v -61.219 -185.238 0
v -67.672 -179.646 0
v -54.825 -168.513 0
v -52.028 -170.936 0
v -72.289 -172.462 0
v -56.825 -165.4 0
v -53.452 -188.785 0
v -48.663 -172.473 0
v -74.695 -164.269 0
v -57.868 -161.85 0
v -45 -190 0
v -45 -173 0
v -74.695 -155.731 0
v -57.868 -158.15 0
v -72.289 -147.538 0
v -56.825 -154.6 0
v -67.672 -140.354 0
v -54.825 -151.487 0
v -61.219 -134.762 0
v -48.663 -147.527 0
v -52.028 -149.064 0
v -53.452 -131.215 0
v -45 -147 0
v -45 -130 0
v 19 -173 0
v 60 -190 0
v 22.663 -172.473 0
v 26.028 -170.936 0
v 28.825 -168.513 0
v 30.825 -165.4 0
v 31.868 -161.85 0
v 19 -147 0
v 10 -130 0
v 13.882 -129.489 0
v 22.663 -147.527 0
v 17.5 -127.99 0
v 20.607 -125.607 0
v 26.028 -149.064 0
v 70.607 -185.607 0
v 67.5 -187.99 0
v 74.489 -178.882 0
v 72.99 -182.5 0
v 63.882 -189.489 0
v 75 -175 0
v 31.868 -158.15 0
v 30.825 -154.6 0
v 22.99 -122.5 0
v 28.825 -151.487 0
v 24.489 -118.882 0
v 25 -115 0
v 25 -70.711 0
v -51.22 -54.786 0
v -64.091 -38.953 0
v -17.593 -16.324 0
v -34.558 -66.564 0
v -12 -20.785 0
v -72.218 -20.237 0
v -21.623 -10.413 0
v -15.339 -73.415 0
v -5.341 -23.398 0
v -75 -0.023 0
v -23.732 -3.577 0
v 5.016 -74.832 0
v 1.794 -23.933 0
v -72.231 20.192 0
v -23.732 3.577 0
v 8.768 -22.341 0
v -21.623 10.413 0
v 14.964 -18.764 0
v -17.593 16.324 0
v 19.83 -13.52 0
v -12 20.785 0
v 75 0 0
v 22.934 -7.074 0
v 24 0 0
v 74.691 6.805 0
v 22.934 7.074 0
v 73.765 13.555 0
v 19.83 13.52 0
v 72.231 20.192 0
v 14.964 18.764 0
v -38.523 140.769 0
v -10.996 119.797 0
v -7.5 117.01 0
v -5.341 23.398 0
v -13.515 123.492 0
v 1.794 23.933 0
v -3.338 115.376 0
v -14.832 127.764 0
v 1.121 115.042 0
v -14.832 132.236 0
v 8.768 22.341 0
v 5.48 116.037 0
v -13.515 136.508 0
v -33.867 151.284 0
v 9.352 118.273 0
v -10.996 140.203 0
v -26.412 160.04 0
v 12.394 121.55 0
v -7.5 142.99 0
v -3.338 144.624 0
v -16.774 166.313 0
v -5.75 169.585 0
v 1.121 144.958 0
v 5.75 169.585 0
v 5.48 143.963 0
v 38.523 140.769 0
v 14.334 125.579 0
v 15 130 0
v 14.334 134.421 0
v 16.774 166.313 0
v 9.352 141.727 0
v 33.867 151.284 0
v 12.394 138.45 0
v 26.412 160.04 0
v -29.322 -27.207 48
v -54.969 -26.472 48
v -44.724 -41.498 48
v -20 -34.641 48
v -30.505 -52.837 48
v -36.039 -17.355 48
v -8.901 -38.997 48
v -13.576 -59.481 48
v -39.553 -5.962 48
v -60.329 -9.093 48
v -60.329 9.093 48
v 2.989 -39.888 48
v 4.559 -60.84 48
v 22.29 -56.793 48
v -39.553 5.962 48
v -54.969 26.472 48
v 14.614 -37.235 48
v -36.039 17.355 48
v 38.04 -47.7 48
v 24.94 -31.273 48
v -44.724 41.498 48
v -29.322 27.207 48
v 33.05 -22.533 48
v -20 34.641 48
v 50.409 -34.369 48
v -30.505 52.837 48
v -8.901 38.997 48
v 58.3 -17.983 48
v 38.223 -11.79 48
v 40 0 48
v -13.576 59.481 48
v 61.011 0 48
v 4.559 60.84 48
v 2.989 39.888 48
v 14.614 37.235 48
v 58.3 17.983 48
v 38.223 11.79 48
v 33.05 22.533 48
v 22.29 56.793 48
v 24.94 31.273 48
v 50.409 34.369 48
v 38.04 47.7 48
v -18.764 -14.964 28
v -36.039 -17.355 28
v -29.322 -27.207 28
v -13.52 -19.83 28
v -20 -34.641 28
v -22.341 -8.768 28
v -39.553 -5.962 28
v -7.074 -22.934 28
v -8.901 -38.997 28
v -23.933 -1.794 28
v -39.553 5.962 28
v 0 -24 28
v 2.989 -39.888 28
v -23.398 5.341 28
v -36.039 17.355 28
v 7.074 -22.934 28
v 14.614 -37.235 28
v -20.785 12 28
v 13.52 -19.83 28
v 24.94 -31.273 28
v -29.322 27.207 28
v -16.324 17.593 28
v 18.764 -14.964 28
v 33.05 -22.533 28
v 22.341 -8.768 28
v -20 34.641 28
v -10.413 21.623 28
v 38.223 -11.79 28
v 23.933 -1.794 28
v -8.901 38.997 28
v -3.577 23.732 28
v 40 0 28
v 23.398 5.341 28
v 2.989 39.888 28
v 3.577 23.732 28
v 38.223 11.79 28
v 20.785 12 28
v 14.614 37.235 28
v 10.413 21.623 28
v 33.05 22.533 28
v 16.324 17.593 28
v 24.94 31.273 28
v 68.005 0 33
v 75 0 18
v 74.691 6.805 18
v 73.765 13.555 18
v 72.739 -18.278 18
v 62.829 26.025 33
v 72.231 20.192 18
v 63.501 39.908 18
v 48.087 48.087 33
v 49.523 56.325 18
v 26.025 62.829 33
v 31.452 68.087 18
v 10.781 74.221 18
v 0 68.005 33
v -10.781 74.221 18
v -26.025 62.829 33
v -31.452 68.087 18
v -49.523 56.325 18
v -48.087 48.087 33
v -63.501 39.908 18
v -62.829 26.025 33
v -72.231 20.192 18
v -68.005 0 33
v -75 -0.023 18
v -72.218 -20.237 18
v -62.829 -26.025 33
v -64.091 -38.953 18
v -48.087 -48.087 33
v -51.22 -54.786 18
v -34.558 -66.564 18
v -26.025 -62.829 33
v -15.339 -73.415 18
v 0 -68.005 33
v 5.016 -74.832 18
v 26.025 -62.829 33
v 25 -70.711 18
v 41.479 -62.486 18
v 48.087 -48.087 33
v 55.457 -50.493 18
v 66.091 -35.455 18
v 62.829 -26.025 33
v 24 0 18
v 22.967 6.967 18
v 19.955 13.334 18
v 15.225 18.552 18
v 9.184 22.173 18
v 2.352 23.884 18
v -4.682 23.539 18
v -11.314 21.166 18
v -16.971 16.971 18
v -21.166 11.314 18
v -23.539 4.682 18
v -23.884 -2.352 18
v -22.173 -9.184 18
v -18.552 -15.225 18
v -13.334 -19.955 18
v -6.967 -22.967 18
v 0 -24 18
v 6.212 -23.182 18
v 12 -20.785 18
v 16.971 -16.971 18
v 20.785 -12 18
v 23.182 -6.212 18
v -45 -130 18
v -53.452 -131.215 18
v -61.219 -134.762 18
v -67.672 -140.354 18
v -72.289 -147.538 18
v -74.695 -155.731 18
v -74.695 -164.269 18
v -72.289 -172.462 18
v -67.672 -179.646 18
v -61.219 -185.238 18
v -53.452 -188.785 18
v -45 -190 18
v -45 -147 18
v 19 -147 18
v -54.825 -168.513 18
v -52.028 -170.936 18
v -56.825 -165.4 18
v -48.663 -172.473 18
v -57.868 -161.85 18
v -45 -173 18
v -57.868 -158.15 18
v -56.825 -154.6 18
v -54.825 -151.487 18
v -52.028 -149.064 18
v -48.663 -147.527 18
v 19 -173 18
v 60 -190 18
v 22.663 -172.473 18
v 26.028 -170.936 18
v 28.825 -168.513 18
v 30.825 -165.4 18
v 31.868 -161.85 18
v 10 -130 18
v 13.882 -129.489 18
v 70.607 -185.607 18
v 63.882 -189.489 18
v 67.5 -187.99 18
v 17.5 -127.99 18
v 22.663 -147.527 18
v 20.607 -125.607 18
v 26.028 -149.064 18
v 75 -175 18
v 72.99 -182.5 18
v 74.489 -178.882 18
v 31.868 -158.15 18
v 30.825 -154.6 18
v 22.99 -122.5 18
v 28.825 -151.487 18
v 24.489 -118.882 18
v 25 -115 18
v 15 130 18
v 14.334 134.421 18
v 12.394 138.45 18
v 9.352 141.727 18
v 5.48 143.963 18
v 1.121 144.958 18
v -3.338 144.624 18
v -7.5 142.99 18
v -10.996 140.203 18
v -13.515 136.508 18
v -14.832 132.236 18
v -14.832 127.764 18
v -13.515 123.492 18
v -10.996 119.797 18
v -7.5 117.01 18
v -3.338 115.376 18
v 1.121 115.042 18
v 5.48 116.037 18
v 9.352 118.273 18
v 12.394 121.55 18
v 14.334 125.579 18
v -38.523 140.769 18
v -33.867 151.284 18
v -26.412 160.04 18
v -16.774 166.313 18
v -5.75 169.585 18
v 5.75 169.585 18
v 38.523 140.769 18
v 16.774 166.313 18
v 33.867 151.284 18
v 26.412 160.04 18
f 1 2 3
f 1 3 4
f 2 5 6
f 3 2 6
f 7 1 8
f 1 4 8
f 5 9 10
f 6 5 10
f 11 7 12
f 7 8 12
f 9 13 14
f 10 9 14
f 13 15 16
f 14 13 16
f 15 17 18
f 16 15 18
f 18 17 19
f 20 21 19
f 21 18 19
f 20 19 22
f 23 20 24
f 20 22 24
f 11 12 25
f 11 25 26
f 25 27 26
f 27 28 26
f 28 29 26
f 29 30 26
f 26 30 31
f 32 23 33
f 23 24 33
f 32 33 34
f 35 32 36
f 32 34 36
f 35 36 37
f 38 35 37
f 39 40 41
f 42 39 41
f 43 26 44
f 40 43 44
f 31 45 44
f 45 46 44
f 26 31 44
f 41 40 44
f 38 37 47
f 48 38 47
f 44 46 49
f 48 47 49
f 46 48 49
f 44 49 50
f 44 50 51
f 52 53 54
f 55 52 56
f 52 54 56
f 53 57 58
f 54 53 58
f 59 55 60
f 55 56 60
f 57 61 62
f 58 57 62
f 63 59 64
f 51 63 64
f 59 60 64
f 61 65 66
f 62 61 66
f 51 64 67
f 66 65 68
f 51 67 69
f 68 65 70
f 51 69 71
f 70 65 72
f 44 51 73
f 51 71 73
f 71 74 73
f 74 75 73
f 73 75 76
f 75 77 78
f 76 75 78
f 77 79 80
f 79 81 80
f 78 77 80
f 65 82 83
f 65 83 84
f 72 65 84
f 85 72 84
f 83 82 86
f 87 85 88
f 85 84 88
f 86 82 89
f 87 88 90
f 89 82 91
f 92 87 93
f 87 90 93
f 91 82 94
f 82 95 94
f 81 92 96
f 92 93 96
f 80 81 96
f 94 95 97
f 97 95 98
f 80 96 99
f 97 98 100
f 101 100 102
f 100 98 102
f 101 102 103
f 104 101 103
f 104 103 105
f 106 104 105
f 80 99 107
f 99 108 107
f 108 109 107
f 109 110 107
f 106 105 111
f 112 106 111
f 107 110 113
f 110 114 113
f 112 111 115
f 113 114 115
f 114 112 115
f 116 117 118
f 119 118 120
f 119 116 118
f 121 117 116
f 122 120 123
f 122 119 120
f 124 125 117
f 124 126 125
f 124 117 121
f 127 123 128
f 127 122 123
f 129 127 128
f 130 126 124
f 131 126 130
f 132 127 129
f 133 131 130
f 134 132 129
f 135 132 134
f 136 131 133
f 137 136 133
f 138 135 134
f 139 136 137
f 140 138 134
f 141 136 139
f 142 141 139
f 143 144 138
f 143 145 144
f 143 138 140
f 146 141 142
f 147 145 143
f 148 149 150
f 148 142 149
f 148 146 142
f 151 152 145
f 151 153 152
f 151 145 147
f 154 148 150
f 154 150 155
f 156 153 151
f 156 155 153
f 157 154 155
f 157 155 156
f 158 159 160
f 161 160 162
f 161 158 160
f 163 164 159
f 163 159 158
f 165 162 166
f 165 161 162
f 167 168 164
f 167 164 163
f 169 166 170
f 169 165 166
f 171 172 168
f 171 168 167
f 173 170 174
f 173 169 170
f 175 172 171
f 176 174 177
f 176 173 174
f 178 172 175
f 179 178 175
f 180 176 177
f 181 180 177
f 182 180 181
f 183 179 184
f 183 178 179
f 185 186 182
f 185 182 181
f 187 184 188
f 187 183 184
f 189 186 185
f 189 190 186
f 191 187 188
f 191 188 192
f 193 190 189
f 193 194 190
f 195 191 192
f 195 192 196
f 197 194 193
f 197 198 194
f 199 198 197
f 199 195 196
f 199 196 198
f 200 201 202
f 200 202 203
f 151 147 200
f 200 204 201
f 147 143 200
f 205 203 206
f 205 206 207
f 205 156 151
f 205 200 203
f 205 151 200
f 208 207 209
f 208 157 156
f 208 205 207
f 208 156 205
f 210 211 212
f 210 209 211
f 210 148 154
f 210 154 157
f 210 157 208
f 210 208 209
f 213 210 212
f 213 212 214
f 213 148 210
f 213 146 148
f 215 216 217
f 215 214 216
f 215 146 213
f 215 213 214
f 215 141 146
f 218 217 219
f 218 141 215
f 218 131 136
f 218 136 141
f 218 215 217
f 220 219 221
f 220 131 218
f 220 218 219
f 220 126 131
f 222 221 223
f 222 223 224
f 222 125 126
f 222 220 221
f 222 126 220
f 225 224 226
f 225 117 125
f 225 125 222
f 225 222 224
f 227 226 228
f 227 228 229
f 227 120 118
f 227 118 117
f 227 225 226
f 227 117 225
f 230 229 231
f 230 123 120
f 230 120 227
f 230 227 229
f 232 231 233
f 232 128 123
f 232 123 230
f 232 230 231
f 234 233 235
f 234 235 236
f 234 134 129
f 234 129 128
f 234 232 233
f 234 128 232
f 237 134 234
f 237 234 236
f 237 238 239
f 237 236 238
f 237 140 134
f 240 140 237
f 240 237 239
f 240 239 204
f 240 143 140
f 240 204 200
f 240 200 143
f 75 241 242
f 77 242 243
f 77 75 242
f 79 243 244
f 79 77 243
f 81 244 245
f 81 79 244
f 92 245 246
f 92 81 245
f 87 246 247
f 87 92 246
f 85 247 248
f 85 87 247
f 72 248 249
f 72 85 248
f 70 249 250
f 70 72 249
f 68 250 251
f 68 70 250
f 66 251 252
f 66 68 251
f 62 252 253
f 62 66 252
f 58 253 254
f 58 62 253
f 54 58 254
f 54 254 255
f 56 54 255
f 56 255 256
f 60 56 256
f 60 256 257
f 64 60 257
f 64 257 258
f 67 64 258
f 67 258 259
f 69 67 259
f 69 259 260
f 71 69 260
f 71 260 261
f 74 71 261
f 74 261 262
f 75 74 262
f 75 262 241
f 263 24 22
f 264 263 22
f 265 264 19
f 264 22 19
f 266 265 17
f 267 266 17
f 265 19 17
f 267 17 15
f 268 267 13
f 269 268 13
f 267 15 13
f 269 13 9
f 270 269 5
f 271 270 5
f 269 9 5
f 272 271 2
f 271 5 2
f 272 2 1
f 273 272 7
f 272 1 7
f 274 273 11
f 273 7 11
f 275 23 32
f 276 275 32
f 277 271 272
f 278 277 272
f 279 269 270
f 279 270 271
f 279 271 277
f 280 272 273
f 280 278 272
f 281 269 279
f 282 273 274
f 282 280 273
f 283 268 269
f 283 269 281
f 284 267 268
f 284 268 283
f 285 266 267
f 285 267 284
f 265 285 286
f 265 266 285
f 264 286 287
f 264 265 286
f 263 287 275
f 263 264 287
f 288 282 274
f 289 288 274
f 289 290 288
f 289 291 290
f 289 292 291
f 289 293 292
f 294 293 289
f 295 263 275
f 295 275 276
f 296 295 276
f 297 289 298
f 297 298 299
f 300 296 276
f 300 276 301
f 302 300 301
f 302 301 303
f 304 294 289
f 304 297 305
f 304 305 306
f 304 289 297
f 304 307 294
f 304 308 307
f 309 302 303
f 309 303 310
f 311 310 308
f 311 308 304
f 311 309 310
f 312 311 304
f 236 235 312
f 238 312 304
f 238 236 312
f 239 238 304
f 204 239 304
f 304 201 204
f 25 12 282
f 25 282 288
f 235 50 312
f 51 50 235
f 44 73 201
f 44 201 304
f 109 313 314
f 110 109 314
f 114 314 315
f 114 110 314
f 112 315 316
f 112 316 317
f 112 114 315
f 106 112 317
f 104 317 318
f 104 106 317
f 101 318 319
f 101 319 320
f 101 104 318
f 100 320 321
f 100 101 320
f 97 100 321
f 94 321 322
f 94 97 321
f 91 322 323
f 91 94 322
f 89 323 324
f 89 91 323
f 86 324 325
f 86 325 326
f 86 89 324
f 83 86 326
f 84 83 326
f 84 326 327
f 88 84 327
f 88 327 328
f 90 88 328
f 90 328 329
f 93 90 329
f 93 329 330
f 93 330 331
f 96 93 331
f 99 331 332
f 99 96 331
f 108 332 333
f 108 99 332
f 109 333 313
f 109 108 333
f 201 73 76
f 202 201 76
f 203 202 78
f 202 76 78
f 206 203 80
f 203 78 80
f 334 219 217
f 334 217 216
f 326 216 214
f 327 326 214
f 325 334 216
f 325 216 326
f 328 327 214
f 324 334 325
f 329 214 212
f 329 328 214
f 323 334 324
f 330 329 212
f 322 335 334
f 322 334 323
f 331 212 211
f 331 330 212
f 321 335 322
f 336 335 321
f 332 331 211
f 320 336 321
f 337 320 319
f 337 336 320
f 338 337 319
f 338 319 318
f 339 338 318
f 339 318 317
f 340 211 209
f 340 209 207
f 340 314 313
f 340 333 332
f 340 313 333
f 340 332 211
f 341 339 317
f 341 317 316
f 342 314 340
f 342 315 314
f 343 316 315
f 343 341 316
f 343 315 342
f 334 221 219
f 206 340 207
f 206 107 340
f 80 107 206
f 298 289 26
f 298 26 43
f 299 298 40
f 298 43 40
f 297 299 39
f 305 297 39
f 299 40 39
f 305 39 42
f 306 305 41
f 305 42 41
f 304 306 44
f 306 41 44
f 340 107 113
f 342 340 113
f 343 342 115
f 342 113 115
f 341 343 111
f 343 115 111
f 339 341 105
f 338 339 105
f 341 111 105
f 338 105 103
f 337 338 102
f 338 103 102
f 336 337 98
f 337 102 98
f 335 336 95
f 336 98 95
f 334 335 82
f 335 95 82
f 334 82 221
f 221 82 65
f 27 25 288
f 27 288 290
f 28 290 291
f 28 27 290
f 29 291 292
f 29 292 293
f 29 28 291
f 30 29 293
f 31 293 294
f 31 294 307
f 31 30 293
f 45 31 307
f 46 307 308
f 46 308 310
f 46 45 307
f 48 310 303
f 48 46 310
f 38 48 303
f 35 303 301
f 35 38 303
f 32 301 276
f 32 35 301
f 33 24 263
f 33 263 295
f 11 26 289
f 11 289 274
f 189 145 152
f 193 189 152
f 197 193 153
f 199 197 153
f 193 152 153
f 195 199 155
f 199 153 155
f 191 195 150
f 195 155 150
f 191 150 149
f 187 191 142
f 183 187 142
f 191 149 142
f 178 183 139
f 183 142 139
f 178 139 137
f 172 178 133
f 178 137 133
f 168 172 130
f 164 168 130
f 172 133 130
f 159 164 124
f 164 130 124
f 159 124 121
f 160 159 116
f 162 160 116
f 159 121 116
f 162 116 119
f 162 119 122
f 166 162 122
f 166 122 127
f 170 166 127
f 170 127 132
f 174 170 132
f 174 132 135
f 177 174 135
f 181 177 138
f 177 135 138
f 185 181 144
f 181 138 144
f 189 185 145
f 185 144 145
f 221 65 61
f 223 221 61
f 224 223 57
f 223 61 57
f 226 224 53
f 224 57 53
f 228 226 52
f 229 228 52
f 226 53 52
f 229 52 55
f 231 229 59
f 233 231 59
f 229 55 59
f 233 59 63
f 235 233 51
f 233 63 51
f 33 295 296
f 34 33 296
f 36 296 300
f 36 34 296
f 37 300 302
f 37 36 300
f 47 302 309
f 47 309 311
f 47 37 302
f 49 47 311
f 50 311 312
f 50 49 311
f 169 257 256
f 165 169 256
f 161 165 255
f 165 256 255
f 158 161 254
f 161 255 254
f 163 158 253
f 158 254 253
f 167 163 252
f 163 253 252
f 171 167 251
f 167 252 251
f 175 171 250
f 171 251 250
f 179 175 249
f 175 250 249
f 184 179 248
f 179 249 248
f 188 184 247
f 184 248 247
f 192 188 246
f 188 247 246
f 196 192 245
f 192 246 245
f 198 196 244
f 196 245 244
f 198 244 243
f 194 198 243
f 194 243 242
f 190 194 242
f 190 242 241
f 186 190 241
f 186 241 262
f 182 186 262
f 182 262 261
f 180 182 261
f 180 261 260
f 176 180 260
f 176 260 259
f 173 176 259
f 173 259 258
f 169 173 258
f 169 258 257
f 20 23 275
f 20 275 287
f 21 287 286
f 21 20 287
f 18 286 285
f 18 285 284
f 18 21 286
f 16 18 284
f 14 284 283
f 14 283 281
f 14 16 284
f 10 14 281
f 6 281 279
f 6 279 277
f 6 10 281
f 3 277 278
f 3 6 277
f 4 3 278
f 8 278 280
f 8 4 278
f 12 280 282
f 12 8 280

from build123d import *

# Parameters (mm, degrees)
SKETCH_R        = 24
SKETCH_R_2      = 15
PAD_DEPTH       = 18
SKETCH001_R     = 75
PAD001_DEPTH    = 30
PAD001_TAPER    = 25
SKETCH002_R     = 40
POCKET_DEPTH    = 20
POCKET_FACE23_R = 24
POCKET001_DEPTH = 30.001


with BuildPart() as part:
    # Sketch → Pad (new body)
    with BuildSketch(Plane.XY):
        with BuildLine():
            ThreePointArc((-72.230677, 20.192308), (-51.220332, -54.785742), (25, -70.710678))
            Line((25, -115), (25, -70.710678))
            ThreePointArc((10, -130), (20.606602, -125.606602), (25, -115))
            Line((-45, -130), (10, -130))
            ThreePointArc((-45, -130), (-75, -160), (-45, -190))
            Line((60, -190), (-45, -190))
            ThreePointArc((60, -190), (70.606602, -185.606602), (75, -175))
            Line((75, 0), (75, -175))
            ThreePointArc((75, 0), (74.304444, 10.190663), (72.230677, 20.192308))
            Line((38.523028, 140.769231), (72.230677, 20.192308))
            ThreePointArc((38.523028, 140.769231), (0, 170), (-38.523028, 140.769231))
            Line((-38.523028, 140.769231), (-72.230677, 20.192308))
        make_face()
        Circle(SKETCH_R, mode=Mode.SUBTRACT)
        with Locations((0, 130)):
            Circle(SKETCH_R_2, mode=Mode.SUBTRACT)
        with BuildLine():
            ThreePointArc((-45, -147), (-58, -160), (-45, -173))
            Line((-45, -173), (19, -173))
            ThreePointArc((19, -173), (32, -160), (19, -147))
            Line((-45, -147), (19, -147))
        make_face(mode=Mode.SUBTRACT)
    extrude(amount=PAD_DEPTH)

    # Sketch001 (on Face20 of Pad) → Pad001 (join)
    with BuildSketch(Plane.XY.offset(18)):
        Circle(SKETCH001_R)
    extrude(amount=PAD001_DEPTH, taper=PAD001_TAPER)

    # Sketch002 (on Face24 of Pad001) → Pocket (cut)
    with BuildSketch(Plane.XY.offset(48)):
        Circle(SKETCH002_R)
    extrude(amount=-POCKET_DEPTH, mode=Mode.SUBTRACT)

    # Pocket Face23 → Pocket001 (cut, through all)
    with BuildSketch(Plane(origin=(0, 0, 18), x_dir=(0, -1, 0), z_dir=(0, 0, -1))):
        Circle(POCKET_FACE23_R)
    extrude(amount=-POCKET001_DEPTH, mode=Mode.SUBTRACT)


solid = part.part
